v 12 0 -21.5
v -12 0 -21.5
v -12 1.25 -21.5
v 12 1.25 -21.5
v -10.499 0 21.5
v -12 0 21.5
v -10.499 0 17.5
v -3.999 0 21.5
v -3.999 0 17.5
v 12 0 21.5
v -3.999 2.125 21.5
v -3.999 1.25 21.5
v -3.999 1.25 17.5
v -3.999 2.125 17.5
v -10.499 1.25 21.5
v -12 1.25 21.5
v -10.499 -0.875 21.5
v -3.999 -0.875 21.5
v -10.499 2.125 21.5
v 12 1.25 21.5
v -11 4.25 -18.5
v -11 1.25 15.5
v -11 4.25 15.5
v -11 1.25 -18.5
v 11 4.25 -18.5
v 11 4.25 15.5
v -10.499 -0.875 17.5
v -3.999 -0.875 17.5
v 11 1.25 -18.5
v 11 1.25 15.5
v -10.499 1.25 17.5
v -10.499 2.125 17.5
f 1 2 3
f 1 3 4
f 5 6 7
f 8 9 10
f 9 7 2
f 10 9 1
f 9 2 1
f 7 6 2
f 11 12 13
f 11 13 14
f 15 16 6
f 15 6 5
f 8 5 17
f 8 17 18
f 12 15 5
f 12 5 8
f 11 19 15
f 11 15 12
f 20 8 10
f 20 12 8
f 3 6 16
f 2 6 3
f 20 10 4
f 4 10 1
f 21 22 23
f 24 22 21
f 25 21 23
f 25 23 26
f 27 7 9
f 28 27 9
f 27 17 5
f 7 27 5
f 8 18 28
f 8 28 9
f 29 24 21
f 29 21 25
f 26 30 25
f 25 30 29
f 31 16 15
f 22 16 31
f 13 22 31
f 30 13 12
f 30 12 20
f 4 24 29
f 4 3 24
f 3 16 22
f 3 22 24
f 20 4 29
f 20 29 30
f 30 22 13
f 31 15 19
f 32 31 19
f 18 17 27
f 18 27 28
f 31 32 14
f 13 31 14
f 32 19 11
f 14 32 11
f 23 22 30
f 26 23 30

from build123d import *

# Parameters (mm, degrees)
SKETCH1_W       = 24
SKETCH1_H       = 43
PCB_DEPTH       = 1.25
SKETCH2_W       = 22
SKETCH2_H       = 34
RF_CASING_DEPTH = 3
SKETCH5_W       = 6.5
SKETCH5_H       = 3
PINS_DEPTH      = 4


with BuildPart() as part:
    # Sketch1 → PCB (new body)
    with BuildSketch(Plane(origin=(0, 0, 0), x_dir=(1, 0, 0), z_dir=(0, 1, 0))):
        Rectangle(SKETCH1_W, SKETCH1_H)
    extrude(amount=PCB_DEPTH)

    # Sketch2 → RF Casing (add)
    with BuildSketch(Plane(origin=(0, 1.25, 0), x_dir=(1, 0, 0), z_dir=(0, 1, 0))):
        with Locations((0, 1.5)):
            Rectangle(SKETCH2_W, SKETCH2_H)
    extrude(amount=RF_CASING_DEPTH)

    # Sketch5 → Pins (add)
    with BuildSketch(Plane.XY.offset(21.5)):
        with Locations((-7.249153049, 0.625)):
            Rectangle(SKETCH5_W, SKETCH5_H)
    extrude(amount=-PINS_DEPTH)


solid = part.part
